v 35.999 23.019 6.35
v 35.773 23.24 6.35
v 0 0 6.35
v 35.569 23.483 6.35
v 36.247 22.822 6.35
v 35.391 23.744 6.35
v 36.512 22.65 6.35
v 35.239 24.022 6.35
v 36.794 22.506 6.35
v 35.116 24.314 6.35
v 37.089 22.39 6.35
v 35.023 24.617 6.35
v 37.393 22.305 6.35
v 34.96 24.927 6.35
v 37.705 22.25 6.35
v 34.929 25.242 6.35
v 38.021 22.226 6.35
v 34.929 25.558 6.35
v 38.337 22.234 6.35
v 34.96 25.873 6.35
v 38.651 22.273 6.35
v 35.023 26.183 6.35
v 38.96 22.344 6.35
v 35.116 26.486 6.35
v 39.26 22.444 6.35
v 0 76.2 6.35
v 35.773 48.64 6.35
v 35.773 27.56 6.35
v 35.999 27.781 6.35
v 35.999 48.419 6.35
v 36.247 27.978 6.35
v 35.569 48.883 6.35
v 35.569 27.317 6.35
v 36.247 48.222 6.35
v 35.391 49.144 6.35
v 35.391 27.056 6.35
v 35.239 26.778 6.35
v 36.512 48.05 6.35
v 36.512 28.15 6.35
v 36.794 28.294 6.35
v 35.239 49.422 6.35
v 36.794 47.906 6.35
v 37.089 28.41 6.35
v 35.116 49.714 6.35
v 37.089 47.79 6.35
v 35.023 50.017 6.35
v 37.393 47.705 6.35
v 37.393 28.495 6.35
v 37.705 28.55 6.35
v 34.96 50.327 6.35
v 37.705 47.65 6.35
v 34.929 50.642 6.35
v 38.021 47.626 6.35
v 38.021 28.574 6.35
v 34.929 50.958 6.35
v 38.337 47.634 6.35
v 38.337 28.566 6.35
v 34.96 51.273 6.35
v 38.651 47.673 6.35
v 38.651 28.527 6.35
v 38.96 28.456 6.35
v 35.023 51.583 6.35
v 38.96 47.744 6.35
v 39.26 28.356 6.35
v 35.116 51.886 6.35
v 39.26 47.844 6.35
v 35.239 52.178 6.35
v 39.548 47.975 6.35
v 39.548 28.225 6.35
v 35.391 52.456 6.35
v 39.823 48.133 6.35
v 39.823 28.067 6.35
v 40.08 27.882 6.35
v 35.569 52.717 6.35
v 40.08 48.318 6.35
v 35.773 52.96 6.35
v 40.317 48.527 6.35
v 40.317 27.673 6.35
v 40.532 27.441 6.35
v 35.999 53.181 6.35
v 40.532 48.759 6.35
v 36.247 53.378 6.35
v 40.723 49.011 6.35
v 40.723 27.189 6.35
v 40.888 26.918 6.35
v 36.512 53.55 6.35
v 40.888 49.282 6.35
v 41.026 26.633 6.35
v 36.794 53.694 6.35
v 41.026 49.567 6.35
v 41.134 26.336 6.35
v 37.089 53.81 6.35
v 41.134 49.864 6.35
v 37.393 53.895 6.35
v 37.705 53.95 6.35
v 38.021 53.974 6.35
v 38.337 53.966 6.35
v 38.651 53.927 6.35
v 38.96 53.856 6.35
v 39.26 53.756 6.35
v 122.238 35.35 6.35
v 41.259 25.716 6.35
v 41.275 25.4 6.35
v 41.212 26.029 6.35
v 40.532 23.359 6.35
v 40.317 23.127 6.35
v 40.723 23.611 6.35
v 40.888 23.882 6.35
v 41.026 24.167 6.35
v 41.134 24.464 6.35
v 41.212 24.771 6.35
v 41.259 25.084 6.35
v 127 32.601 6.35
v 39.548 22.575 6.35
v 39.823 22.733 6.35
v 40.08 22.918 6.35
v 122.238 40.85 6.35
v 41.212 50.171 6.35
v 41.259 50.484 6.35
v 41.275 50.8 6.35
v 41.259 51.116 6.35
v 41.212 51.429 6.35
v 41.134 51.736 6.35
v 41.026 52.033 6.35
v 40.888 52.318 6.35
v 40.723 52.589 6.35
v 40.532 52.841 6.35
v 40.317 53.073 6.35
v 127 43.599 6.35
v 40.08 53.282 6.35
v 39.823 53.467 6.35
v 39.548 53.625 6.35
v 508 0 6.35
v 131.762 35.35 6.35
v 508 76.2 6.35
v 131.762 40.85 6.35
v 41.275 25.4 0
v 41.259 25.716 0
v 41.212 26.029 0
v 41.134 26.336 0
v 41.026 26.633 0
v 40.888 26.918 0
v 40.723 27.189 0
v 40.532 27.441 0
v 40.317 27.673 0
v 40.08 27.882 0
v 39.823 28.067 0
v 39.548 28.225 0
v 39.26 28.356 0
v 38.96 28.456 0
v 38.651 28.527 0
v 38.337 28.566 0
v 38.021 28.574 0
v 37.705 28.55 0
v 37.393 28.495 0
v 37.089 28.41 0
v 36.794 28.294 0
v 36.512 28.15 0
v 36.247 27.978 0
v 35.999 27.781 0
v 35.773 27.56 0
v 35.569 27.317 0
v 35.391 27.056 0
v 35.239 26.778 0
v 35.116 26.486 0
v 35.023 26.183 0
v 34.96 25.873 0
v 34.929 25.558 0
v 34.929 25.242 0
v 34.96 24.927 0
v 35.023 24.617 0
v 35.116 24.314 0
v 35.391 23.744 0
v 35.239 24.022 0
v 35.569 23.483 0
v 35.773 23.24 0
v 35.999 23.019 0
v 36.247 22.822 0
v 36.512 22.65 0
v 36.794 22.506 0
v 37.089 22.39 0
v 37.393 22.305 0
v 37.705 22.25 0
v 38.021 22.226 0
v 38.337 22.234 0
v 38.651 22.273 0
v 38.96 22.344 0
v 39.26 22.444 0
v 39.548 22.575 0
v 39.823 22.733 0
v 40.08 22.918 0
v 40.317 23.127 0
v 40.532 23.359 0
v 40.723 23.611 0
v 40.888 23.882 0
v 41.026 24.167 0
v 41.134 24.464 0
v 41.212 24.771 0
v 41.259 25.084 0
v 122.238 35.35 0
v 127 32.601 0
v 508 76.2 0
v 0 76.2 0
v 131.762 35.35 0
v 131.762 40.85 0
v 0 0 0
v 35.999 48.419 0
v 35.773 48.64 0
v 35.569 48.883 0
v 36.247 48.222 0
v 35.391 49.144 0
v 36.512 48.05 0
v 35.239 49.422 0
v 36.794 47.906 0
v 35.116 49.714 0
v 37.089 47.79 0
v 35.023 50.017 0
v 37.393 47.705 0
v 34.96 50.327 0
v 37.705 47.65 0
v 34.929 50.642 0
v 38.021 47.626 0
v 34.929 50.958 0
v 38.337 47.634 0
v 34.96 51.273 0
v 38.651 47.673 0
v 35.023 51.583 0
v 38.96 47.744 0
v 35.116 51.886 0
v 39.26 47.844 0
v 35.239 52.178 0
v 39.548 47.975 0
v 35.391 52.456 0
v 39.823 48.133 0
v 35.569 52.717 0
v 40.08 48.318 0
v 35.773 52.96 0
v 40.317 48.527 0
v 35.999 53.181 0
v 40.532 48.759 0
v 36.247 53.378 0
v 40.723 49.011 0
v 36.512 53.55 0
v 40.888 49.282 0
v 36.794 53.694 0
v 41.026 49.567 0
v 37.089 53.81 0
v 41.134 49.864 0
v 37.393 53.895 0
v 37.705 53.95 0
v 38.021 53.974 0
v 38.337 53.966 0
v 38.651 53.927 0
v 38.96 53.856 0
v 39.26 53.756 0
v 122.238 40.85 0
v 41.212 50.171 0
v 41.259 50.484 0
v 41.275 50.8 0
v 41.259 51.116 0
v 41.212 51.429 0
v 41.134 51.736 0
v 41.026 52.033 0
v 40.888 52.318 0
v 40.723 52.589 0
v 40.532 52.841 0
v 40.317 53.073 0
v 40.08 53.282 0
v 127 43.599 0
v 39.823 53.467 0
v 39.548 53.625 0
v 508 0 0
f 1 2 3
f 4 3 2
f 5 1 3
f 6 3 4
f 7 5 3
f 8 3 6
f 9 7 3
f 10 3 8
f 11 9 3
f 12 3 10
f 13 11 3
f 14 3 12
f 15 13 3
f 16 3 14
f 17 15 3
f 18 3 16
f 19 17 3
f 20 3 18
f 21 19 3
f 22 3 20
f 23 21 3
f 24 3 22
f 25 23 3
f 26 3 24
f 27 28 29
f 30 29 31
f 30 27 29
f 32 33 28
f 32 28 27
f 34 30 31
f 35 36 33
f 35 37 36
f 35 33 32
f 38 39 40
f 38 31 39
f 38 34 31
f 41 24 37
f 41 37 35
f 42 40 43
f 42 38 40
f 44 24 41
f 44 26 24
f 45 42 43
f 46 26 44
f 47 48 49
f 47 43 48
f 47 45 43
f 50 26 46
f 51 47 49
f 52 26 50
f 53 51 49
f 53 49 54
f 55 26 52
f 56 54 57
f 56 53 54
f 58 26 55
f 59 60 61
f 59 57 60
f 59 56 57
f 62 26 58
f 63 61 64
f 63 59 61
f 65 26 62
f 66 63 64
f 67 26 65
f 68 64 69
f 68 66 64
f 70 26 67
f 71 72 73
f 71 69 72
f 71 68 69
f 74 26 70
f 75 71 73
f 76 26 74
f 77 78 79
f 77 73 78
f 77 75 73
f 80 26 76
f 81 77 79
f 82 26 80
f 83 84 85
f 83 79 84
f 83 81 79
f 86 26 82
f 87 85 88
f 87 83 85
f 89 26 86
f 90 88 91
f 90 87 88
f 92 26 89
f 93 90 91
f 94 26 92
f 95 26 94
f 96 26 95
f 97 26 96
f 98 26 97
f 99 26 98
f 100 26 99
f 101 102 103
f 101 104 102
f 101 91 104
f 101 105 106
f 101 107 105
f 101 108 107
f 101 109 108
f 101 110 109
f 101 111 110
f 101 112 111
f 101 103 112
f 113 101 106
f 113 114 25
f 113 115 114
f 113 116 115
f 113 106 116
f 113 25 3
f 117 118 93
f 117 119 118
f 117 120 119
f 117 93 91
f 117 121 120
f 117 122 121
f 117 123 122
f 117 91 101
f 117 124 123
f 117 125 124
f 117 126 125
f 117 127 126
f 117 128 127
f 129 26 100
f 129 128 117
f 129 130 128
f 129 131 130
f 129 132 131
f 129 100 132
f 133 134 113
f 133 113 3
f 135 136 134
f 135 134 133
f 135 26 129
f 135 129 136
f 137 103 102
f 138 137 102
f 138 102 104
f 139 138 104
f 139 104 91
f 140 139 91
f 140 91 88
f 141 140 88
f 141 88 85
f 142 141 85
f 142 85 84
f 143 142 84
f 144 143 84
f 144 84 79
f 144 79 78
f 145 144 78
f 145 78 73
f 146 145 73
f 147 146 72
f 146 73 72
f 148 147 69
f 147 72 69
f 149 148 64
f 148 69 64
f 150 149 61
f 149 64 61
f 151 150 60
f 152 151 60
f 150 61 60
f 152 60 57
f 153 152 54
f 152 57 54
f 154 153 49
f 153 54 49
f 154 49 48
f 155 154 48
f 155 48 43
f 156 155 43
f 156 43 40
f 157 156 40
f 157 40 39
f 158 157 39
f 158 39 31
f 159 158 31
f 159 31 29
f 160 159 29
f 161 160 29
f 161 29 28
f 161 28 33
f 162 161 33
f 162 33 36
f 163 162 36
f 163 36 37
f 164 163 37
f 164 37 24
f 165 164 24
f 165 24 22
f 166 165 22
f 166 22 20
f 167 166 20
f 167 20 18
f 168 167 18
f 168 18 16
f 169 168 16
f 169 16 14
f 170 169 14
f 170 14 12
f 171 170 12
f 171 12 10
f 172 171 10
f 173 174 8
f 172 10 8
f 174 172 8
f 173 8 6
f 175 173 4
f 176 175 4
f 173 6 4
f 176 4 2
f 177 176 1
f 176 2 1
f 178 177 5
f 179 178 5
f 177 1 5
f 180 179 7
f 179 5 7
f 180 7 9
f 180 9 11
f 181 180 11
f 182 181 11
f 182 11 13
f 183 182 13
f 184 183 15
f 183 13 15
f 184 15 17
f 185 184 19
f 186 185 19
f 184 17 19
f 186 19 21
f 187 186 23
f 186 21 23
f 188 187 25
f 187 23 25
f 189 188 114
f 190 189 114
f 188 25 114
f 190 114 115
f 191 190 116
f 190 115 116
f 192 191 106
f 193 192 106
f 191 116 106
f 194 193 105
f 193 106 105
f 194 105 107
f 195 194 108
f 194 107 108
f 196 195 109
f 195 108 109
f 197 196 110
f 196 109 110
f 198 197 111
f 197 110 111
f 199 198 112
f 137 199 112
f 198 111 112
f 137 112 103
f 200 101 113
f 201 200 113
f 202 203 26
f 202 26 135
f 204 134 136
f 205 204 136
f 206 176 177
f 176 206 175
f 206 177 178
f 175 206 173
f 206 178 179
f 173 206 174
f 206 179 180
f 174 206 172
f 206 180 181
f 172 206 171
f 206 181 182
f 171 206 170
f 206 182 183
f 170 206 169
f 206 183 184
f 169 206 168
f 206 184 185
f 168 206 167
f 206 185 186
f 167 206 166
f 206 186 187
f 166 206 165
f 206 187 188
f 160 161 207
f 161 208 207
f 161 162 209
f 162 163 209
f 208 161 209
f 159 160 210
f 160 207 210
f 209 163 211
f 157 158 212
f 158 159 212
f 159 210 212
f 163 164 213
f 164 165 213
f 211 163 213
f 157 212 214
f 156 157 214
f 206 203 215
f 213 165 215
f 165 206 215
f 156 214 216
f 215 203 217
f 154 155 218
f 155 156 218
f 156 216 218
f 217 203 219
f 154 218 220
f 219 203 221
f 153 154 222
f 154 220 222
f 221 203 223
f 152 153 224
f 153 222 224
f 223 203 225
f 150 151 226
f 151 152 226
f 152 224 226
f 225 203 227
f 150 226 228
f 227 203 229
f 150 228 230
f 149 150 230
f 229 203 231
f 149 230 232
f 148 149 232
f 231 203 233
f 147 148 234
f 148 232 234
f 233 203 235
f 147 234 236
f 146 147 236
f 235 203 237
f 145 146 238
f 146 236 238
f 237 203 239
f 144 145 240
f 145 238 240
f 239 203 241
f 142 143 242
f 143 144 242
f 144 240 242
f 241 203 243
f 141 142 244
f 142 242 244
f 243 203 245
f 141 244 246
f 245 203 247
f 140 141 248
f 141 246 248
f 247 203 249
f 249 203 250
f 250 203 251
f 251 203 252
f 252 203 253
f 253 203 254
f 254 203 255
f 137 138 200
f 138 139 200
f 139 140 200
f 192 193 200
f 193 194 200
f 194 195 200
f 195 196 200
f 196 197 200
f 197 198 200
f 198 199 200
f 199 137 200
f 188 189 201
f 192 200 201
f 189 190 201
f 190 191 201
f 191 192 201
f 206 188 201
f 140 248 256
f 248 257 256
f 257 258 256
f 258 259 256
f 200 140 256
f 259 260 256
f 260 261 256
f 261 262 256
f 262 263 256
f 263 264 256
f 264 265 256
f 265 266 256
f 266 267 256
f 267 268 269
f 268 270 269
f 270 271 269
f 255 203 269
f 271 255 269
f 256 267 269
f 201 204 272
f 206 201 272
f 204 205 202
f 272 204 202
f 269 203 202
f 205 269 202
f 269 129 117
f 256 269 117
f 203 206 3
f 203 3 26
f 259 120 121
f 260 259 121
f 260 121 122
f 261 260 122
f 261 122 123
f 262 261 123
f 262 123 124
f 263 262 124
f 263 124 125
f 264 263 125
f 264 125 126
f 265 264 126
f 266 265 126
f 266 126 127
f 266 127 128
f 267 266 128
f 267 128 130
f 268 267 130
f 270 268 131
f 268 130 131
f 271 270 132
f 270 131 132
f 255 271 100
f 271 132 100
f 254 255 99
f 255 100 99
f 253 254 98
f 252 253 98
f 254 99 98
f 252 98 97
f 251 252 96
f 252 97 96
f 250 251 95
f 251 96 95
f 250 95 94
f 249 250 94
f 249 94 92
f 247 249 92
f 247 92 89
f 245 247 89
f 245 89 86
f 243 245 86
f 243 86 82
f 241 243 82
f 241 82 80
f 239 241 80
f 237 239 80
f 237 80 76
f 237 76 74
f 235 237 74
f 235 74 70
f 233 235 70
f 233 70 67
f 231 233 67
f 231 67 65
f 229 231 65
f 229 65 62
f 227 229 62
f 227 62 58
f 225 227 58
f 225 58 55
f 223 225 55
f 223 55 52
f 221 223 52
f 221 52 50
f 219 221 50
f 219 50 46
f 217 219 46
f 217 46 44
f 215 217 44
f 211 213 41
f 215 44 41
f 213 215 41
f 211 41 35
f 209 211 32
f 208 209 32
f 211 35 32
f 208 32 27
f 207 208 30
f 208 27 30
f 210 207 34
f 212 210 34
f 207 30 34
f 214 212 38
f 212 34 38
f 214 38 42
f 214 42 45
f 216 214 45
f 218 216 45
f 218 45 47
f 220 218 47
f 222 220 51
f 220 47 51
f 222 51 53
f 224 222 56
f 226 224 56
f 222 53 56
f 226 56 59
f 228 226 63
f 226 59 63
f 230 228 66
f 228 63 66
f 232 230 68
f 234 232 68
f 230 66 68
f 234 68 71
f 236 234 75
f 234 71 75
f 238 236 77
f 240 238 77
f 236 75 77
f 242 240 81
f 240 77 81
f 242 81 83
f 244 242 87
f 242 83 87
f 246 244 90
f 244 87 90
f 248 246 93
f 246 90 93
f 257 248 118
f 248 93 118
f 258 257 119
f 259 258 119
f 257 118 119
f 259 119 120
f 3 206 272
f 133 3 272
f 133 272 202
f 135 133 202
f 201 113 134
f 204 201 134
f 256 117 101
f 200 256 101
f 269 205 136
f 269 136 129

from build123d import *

# Parameters (mm, degrees)
SKETCH1_W           = 508
SKETCH1_H           = 76.2
BOSS_EXTRUDE1_DEPTH = 6.35
CUT_EXTRUDE6_DEPTH  = 7.35
SKETCH6_R           = 3.175
CUT_EXTRUDE7_DEPTH  = 7.35


with BuildPart() as part:
    # Sketch1 → Boss-Extrude1 (new body)
    with BuildSketch(Plane.XY):
        with Locations((254, 38.1)):
            Rectangle(SKETCH1_W, SKETCH1_H)
    extrude(amount=BOSS_EXTRUDE1_DEPTH)

    # Sketch4 → Cut-Extrude6 (cut, through all)
    with BuildSketch(Plane.XY.offset(6.35)):
        Polygon((127, 43.5991), (122.237639702, 40.84955), (122.237639702, 35.35045), (127, 32.6009), (131.762360298, 35.35045), (131.762360298, 40.84955), align=None)
    extrude(amount=-CUT_EXTRUDE6_DEPTH, mode=Mode.SUBTRACT)

    # Sketch6 → Cut-Extrude7 (cut, through all)
    with BuildSketch(Plane.XY.offset(6.35)):
        with Locations((38.1, 50.8)):
            Circle(SKETCH6_R)
        with Locations((38.1, 25.4)):
            Circle(SKETCH6_R)
    extrude(amount=-CUT_EXTRUDE7_DEPTH, mode=Mode.SUBTRACT)


solid = part.part
